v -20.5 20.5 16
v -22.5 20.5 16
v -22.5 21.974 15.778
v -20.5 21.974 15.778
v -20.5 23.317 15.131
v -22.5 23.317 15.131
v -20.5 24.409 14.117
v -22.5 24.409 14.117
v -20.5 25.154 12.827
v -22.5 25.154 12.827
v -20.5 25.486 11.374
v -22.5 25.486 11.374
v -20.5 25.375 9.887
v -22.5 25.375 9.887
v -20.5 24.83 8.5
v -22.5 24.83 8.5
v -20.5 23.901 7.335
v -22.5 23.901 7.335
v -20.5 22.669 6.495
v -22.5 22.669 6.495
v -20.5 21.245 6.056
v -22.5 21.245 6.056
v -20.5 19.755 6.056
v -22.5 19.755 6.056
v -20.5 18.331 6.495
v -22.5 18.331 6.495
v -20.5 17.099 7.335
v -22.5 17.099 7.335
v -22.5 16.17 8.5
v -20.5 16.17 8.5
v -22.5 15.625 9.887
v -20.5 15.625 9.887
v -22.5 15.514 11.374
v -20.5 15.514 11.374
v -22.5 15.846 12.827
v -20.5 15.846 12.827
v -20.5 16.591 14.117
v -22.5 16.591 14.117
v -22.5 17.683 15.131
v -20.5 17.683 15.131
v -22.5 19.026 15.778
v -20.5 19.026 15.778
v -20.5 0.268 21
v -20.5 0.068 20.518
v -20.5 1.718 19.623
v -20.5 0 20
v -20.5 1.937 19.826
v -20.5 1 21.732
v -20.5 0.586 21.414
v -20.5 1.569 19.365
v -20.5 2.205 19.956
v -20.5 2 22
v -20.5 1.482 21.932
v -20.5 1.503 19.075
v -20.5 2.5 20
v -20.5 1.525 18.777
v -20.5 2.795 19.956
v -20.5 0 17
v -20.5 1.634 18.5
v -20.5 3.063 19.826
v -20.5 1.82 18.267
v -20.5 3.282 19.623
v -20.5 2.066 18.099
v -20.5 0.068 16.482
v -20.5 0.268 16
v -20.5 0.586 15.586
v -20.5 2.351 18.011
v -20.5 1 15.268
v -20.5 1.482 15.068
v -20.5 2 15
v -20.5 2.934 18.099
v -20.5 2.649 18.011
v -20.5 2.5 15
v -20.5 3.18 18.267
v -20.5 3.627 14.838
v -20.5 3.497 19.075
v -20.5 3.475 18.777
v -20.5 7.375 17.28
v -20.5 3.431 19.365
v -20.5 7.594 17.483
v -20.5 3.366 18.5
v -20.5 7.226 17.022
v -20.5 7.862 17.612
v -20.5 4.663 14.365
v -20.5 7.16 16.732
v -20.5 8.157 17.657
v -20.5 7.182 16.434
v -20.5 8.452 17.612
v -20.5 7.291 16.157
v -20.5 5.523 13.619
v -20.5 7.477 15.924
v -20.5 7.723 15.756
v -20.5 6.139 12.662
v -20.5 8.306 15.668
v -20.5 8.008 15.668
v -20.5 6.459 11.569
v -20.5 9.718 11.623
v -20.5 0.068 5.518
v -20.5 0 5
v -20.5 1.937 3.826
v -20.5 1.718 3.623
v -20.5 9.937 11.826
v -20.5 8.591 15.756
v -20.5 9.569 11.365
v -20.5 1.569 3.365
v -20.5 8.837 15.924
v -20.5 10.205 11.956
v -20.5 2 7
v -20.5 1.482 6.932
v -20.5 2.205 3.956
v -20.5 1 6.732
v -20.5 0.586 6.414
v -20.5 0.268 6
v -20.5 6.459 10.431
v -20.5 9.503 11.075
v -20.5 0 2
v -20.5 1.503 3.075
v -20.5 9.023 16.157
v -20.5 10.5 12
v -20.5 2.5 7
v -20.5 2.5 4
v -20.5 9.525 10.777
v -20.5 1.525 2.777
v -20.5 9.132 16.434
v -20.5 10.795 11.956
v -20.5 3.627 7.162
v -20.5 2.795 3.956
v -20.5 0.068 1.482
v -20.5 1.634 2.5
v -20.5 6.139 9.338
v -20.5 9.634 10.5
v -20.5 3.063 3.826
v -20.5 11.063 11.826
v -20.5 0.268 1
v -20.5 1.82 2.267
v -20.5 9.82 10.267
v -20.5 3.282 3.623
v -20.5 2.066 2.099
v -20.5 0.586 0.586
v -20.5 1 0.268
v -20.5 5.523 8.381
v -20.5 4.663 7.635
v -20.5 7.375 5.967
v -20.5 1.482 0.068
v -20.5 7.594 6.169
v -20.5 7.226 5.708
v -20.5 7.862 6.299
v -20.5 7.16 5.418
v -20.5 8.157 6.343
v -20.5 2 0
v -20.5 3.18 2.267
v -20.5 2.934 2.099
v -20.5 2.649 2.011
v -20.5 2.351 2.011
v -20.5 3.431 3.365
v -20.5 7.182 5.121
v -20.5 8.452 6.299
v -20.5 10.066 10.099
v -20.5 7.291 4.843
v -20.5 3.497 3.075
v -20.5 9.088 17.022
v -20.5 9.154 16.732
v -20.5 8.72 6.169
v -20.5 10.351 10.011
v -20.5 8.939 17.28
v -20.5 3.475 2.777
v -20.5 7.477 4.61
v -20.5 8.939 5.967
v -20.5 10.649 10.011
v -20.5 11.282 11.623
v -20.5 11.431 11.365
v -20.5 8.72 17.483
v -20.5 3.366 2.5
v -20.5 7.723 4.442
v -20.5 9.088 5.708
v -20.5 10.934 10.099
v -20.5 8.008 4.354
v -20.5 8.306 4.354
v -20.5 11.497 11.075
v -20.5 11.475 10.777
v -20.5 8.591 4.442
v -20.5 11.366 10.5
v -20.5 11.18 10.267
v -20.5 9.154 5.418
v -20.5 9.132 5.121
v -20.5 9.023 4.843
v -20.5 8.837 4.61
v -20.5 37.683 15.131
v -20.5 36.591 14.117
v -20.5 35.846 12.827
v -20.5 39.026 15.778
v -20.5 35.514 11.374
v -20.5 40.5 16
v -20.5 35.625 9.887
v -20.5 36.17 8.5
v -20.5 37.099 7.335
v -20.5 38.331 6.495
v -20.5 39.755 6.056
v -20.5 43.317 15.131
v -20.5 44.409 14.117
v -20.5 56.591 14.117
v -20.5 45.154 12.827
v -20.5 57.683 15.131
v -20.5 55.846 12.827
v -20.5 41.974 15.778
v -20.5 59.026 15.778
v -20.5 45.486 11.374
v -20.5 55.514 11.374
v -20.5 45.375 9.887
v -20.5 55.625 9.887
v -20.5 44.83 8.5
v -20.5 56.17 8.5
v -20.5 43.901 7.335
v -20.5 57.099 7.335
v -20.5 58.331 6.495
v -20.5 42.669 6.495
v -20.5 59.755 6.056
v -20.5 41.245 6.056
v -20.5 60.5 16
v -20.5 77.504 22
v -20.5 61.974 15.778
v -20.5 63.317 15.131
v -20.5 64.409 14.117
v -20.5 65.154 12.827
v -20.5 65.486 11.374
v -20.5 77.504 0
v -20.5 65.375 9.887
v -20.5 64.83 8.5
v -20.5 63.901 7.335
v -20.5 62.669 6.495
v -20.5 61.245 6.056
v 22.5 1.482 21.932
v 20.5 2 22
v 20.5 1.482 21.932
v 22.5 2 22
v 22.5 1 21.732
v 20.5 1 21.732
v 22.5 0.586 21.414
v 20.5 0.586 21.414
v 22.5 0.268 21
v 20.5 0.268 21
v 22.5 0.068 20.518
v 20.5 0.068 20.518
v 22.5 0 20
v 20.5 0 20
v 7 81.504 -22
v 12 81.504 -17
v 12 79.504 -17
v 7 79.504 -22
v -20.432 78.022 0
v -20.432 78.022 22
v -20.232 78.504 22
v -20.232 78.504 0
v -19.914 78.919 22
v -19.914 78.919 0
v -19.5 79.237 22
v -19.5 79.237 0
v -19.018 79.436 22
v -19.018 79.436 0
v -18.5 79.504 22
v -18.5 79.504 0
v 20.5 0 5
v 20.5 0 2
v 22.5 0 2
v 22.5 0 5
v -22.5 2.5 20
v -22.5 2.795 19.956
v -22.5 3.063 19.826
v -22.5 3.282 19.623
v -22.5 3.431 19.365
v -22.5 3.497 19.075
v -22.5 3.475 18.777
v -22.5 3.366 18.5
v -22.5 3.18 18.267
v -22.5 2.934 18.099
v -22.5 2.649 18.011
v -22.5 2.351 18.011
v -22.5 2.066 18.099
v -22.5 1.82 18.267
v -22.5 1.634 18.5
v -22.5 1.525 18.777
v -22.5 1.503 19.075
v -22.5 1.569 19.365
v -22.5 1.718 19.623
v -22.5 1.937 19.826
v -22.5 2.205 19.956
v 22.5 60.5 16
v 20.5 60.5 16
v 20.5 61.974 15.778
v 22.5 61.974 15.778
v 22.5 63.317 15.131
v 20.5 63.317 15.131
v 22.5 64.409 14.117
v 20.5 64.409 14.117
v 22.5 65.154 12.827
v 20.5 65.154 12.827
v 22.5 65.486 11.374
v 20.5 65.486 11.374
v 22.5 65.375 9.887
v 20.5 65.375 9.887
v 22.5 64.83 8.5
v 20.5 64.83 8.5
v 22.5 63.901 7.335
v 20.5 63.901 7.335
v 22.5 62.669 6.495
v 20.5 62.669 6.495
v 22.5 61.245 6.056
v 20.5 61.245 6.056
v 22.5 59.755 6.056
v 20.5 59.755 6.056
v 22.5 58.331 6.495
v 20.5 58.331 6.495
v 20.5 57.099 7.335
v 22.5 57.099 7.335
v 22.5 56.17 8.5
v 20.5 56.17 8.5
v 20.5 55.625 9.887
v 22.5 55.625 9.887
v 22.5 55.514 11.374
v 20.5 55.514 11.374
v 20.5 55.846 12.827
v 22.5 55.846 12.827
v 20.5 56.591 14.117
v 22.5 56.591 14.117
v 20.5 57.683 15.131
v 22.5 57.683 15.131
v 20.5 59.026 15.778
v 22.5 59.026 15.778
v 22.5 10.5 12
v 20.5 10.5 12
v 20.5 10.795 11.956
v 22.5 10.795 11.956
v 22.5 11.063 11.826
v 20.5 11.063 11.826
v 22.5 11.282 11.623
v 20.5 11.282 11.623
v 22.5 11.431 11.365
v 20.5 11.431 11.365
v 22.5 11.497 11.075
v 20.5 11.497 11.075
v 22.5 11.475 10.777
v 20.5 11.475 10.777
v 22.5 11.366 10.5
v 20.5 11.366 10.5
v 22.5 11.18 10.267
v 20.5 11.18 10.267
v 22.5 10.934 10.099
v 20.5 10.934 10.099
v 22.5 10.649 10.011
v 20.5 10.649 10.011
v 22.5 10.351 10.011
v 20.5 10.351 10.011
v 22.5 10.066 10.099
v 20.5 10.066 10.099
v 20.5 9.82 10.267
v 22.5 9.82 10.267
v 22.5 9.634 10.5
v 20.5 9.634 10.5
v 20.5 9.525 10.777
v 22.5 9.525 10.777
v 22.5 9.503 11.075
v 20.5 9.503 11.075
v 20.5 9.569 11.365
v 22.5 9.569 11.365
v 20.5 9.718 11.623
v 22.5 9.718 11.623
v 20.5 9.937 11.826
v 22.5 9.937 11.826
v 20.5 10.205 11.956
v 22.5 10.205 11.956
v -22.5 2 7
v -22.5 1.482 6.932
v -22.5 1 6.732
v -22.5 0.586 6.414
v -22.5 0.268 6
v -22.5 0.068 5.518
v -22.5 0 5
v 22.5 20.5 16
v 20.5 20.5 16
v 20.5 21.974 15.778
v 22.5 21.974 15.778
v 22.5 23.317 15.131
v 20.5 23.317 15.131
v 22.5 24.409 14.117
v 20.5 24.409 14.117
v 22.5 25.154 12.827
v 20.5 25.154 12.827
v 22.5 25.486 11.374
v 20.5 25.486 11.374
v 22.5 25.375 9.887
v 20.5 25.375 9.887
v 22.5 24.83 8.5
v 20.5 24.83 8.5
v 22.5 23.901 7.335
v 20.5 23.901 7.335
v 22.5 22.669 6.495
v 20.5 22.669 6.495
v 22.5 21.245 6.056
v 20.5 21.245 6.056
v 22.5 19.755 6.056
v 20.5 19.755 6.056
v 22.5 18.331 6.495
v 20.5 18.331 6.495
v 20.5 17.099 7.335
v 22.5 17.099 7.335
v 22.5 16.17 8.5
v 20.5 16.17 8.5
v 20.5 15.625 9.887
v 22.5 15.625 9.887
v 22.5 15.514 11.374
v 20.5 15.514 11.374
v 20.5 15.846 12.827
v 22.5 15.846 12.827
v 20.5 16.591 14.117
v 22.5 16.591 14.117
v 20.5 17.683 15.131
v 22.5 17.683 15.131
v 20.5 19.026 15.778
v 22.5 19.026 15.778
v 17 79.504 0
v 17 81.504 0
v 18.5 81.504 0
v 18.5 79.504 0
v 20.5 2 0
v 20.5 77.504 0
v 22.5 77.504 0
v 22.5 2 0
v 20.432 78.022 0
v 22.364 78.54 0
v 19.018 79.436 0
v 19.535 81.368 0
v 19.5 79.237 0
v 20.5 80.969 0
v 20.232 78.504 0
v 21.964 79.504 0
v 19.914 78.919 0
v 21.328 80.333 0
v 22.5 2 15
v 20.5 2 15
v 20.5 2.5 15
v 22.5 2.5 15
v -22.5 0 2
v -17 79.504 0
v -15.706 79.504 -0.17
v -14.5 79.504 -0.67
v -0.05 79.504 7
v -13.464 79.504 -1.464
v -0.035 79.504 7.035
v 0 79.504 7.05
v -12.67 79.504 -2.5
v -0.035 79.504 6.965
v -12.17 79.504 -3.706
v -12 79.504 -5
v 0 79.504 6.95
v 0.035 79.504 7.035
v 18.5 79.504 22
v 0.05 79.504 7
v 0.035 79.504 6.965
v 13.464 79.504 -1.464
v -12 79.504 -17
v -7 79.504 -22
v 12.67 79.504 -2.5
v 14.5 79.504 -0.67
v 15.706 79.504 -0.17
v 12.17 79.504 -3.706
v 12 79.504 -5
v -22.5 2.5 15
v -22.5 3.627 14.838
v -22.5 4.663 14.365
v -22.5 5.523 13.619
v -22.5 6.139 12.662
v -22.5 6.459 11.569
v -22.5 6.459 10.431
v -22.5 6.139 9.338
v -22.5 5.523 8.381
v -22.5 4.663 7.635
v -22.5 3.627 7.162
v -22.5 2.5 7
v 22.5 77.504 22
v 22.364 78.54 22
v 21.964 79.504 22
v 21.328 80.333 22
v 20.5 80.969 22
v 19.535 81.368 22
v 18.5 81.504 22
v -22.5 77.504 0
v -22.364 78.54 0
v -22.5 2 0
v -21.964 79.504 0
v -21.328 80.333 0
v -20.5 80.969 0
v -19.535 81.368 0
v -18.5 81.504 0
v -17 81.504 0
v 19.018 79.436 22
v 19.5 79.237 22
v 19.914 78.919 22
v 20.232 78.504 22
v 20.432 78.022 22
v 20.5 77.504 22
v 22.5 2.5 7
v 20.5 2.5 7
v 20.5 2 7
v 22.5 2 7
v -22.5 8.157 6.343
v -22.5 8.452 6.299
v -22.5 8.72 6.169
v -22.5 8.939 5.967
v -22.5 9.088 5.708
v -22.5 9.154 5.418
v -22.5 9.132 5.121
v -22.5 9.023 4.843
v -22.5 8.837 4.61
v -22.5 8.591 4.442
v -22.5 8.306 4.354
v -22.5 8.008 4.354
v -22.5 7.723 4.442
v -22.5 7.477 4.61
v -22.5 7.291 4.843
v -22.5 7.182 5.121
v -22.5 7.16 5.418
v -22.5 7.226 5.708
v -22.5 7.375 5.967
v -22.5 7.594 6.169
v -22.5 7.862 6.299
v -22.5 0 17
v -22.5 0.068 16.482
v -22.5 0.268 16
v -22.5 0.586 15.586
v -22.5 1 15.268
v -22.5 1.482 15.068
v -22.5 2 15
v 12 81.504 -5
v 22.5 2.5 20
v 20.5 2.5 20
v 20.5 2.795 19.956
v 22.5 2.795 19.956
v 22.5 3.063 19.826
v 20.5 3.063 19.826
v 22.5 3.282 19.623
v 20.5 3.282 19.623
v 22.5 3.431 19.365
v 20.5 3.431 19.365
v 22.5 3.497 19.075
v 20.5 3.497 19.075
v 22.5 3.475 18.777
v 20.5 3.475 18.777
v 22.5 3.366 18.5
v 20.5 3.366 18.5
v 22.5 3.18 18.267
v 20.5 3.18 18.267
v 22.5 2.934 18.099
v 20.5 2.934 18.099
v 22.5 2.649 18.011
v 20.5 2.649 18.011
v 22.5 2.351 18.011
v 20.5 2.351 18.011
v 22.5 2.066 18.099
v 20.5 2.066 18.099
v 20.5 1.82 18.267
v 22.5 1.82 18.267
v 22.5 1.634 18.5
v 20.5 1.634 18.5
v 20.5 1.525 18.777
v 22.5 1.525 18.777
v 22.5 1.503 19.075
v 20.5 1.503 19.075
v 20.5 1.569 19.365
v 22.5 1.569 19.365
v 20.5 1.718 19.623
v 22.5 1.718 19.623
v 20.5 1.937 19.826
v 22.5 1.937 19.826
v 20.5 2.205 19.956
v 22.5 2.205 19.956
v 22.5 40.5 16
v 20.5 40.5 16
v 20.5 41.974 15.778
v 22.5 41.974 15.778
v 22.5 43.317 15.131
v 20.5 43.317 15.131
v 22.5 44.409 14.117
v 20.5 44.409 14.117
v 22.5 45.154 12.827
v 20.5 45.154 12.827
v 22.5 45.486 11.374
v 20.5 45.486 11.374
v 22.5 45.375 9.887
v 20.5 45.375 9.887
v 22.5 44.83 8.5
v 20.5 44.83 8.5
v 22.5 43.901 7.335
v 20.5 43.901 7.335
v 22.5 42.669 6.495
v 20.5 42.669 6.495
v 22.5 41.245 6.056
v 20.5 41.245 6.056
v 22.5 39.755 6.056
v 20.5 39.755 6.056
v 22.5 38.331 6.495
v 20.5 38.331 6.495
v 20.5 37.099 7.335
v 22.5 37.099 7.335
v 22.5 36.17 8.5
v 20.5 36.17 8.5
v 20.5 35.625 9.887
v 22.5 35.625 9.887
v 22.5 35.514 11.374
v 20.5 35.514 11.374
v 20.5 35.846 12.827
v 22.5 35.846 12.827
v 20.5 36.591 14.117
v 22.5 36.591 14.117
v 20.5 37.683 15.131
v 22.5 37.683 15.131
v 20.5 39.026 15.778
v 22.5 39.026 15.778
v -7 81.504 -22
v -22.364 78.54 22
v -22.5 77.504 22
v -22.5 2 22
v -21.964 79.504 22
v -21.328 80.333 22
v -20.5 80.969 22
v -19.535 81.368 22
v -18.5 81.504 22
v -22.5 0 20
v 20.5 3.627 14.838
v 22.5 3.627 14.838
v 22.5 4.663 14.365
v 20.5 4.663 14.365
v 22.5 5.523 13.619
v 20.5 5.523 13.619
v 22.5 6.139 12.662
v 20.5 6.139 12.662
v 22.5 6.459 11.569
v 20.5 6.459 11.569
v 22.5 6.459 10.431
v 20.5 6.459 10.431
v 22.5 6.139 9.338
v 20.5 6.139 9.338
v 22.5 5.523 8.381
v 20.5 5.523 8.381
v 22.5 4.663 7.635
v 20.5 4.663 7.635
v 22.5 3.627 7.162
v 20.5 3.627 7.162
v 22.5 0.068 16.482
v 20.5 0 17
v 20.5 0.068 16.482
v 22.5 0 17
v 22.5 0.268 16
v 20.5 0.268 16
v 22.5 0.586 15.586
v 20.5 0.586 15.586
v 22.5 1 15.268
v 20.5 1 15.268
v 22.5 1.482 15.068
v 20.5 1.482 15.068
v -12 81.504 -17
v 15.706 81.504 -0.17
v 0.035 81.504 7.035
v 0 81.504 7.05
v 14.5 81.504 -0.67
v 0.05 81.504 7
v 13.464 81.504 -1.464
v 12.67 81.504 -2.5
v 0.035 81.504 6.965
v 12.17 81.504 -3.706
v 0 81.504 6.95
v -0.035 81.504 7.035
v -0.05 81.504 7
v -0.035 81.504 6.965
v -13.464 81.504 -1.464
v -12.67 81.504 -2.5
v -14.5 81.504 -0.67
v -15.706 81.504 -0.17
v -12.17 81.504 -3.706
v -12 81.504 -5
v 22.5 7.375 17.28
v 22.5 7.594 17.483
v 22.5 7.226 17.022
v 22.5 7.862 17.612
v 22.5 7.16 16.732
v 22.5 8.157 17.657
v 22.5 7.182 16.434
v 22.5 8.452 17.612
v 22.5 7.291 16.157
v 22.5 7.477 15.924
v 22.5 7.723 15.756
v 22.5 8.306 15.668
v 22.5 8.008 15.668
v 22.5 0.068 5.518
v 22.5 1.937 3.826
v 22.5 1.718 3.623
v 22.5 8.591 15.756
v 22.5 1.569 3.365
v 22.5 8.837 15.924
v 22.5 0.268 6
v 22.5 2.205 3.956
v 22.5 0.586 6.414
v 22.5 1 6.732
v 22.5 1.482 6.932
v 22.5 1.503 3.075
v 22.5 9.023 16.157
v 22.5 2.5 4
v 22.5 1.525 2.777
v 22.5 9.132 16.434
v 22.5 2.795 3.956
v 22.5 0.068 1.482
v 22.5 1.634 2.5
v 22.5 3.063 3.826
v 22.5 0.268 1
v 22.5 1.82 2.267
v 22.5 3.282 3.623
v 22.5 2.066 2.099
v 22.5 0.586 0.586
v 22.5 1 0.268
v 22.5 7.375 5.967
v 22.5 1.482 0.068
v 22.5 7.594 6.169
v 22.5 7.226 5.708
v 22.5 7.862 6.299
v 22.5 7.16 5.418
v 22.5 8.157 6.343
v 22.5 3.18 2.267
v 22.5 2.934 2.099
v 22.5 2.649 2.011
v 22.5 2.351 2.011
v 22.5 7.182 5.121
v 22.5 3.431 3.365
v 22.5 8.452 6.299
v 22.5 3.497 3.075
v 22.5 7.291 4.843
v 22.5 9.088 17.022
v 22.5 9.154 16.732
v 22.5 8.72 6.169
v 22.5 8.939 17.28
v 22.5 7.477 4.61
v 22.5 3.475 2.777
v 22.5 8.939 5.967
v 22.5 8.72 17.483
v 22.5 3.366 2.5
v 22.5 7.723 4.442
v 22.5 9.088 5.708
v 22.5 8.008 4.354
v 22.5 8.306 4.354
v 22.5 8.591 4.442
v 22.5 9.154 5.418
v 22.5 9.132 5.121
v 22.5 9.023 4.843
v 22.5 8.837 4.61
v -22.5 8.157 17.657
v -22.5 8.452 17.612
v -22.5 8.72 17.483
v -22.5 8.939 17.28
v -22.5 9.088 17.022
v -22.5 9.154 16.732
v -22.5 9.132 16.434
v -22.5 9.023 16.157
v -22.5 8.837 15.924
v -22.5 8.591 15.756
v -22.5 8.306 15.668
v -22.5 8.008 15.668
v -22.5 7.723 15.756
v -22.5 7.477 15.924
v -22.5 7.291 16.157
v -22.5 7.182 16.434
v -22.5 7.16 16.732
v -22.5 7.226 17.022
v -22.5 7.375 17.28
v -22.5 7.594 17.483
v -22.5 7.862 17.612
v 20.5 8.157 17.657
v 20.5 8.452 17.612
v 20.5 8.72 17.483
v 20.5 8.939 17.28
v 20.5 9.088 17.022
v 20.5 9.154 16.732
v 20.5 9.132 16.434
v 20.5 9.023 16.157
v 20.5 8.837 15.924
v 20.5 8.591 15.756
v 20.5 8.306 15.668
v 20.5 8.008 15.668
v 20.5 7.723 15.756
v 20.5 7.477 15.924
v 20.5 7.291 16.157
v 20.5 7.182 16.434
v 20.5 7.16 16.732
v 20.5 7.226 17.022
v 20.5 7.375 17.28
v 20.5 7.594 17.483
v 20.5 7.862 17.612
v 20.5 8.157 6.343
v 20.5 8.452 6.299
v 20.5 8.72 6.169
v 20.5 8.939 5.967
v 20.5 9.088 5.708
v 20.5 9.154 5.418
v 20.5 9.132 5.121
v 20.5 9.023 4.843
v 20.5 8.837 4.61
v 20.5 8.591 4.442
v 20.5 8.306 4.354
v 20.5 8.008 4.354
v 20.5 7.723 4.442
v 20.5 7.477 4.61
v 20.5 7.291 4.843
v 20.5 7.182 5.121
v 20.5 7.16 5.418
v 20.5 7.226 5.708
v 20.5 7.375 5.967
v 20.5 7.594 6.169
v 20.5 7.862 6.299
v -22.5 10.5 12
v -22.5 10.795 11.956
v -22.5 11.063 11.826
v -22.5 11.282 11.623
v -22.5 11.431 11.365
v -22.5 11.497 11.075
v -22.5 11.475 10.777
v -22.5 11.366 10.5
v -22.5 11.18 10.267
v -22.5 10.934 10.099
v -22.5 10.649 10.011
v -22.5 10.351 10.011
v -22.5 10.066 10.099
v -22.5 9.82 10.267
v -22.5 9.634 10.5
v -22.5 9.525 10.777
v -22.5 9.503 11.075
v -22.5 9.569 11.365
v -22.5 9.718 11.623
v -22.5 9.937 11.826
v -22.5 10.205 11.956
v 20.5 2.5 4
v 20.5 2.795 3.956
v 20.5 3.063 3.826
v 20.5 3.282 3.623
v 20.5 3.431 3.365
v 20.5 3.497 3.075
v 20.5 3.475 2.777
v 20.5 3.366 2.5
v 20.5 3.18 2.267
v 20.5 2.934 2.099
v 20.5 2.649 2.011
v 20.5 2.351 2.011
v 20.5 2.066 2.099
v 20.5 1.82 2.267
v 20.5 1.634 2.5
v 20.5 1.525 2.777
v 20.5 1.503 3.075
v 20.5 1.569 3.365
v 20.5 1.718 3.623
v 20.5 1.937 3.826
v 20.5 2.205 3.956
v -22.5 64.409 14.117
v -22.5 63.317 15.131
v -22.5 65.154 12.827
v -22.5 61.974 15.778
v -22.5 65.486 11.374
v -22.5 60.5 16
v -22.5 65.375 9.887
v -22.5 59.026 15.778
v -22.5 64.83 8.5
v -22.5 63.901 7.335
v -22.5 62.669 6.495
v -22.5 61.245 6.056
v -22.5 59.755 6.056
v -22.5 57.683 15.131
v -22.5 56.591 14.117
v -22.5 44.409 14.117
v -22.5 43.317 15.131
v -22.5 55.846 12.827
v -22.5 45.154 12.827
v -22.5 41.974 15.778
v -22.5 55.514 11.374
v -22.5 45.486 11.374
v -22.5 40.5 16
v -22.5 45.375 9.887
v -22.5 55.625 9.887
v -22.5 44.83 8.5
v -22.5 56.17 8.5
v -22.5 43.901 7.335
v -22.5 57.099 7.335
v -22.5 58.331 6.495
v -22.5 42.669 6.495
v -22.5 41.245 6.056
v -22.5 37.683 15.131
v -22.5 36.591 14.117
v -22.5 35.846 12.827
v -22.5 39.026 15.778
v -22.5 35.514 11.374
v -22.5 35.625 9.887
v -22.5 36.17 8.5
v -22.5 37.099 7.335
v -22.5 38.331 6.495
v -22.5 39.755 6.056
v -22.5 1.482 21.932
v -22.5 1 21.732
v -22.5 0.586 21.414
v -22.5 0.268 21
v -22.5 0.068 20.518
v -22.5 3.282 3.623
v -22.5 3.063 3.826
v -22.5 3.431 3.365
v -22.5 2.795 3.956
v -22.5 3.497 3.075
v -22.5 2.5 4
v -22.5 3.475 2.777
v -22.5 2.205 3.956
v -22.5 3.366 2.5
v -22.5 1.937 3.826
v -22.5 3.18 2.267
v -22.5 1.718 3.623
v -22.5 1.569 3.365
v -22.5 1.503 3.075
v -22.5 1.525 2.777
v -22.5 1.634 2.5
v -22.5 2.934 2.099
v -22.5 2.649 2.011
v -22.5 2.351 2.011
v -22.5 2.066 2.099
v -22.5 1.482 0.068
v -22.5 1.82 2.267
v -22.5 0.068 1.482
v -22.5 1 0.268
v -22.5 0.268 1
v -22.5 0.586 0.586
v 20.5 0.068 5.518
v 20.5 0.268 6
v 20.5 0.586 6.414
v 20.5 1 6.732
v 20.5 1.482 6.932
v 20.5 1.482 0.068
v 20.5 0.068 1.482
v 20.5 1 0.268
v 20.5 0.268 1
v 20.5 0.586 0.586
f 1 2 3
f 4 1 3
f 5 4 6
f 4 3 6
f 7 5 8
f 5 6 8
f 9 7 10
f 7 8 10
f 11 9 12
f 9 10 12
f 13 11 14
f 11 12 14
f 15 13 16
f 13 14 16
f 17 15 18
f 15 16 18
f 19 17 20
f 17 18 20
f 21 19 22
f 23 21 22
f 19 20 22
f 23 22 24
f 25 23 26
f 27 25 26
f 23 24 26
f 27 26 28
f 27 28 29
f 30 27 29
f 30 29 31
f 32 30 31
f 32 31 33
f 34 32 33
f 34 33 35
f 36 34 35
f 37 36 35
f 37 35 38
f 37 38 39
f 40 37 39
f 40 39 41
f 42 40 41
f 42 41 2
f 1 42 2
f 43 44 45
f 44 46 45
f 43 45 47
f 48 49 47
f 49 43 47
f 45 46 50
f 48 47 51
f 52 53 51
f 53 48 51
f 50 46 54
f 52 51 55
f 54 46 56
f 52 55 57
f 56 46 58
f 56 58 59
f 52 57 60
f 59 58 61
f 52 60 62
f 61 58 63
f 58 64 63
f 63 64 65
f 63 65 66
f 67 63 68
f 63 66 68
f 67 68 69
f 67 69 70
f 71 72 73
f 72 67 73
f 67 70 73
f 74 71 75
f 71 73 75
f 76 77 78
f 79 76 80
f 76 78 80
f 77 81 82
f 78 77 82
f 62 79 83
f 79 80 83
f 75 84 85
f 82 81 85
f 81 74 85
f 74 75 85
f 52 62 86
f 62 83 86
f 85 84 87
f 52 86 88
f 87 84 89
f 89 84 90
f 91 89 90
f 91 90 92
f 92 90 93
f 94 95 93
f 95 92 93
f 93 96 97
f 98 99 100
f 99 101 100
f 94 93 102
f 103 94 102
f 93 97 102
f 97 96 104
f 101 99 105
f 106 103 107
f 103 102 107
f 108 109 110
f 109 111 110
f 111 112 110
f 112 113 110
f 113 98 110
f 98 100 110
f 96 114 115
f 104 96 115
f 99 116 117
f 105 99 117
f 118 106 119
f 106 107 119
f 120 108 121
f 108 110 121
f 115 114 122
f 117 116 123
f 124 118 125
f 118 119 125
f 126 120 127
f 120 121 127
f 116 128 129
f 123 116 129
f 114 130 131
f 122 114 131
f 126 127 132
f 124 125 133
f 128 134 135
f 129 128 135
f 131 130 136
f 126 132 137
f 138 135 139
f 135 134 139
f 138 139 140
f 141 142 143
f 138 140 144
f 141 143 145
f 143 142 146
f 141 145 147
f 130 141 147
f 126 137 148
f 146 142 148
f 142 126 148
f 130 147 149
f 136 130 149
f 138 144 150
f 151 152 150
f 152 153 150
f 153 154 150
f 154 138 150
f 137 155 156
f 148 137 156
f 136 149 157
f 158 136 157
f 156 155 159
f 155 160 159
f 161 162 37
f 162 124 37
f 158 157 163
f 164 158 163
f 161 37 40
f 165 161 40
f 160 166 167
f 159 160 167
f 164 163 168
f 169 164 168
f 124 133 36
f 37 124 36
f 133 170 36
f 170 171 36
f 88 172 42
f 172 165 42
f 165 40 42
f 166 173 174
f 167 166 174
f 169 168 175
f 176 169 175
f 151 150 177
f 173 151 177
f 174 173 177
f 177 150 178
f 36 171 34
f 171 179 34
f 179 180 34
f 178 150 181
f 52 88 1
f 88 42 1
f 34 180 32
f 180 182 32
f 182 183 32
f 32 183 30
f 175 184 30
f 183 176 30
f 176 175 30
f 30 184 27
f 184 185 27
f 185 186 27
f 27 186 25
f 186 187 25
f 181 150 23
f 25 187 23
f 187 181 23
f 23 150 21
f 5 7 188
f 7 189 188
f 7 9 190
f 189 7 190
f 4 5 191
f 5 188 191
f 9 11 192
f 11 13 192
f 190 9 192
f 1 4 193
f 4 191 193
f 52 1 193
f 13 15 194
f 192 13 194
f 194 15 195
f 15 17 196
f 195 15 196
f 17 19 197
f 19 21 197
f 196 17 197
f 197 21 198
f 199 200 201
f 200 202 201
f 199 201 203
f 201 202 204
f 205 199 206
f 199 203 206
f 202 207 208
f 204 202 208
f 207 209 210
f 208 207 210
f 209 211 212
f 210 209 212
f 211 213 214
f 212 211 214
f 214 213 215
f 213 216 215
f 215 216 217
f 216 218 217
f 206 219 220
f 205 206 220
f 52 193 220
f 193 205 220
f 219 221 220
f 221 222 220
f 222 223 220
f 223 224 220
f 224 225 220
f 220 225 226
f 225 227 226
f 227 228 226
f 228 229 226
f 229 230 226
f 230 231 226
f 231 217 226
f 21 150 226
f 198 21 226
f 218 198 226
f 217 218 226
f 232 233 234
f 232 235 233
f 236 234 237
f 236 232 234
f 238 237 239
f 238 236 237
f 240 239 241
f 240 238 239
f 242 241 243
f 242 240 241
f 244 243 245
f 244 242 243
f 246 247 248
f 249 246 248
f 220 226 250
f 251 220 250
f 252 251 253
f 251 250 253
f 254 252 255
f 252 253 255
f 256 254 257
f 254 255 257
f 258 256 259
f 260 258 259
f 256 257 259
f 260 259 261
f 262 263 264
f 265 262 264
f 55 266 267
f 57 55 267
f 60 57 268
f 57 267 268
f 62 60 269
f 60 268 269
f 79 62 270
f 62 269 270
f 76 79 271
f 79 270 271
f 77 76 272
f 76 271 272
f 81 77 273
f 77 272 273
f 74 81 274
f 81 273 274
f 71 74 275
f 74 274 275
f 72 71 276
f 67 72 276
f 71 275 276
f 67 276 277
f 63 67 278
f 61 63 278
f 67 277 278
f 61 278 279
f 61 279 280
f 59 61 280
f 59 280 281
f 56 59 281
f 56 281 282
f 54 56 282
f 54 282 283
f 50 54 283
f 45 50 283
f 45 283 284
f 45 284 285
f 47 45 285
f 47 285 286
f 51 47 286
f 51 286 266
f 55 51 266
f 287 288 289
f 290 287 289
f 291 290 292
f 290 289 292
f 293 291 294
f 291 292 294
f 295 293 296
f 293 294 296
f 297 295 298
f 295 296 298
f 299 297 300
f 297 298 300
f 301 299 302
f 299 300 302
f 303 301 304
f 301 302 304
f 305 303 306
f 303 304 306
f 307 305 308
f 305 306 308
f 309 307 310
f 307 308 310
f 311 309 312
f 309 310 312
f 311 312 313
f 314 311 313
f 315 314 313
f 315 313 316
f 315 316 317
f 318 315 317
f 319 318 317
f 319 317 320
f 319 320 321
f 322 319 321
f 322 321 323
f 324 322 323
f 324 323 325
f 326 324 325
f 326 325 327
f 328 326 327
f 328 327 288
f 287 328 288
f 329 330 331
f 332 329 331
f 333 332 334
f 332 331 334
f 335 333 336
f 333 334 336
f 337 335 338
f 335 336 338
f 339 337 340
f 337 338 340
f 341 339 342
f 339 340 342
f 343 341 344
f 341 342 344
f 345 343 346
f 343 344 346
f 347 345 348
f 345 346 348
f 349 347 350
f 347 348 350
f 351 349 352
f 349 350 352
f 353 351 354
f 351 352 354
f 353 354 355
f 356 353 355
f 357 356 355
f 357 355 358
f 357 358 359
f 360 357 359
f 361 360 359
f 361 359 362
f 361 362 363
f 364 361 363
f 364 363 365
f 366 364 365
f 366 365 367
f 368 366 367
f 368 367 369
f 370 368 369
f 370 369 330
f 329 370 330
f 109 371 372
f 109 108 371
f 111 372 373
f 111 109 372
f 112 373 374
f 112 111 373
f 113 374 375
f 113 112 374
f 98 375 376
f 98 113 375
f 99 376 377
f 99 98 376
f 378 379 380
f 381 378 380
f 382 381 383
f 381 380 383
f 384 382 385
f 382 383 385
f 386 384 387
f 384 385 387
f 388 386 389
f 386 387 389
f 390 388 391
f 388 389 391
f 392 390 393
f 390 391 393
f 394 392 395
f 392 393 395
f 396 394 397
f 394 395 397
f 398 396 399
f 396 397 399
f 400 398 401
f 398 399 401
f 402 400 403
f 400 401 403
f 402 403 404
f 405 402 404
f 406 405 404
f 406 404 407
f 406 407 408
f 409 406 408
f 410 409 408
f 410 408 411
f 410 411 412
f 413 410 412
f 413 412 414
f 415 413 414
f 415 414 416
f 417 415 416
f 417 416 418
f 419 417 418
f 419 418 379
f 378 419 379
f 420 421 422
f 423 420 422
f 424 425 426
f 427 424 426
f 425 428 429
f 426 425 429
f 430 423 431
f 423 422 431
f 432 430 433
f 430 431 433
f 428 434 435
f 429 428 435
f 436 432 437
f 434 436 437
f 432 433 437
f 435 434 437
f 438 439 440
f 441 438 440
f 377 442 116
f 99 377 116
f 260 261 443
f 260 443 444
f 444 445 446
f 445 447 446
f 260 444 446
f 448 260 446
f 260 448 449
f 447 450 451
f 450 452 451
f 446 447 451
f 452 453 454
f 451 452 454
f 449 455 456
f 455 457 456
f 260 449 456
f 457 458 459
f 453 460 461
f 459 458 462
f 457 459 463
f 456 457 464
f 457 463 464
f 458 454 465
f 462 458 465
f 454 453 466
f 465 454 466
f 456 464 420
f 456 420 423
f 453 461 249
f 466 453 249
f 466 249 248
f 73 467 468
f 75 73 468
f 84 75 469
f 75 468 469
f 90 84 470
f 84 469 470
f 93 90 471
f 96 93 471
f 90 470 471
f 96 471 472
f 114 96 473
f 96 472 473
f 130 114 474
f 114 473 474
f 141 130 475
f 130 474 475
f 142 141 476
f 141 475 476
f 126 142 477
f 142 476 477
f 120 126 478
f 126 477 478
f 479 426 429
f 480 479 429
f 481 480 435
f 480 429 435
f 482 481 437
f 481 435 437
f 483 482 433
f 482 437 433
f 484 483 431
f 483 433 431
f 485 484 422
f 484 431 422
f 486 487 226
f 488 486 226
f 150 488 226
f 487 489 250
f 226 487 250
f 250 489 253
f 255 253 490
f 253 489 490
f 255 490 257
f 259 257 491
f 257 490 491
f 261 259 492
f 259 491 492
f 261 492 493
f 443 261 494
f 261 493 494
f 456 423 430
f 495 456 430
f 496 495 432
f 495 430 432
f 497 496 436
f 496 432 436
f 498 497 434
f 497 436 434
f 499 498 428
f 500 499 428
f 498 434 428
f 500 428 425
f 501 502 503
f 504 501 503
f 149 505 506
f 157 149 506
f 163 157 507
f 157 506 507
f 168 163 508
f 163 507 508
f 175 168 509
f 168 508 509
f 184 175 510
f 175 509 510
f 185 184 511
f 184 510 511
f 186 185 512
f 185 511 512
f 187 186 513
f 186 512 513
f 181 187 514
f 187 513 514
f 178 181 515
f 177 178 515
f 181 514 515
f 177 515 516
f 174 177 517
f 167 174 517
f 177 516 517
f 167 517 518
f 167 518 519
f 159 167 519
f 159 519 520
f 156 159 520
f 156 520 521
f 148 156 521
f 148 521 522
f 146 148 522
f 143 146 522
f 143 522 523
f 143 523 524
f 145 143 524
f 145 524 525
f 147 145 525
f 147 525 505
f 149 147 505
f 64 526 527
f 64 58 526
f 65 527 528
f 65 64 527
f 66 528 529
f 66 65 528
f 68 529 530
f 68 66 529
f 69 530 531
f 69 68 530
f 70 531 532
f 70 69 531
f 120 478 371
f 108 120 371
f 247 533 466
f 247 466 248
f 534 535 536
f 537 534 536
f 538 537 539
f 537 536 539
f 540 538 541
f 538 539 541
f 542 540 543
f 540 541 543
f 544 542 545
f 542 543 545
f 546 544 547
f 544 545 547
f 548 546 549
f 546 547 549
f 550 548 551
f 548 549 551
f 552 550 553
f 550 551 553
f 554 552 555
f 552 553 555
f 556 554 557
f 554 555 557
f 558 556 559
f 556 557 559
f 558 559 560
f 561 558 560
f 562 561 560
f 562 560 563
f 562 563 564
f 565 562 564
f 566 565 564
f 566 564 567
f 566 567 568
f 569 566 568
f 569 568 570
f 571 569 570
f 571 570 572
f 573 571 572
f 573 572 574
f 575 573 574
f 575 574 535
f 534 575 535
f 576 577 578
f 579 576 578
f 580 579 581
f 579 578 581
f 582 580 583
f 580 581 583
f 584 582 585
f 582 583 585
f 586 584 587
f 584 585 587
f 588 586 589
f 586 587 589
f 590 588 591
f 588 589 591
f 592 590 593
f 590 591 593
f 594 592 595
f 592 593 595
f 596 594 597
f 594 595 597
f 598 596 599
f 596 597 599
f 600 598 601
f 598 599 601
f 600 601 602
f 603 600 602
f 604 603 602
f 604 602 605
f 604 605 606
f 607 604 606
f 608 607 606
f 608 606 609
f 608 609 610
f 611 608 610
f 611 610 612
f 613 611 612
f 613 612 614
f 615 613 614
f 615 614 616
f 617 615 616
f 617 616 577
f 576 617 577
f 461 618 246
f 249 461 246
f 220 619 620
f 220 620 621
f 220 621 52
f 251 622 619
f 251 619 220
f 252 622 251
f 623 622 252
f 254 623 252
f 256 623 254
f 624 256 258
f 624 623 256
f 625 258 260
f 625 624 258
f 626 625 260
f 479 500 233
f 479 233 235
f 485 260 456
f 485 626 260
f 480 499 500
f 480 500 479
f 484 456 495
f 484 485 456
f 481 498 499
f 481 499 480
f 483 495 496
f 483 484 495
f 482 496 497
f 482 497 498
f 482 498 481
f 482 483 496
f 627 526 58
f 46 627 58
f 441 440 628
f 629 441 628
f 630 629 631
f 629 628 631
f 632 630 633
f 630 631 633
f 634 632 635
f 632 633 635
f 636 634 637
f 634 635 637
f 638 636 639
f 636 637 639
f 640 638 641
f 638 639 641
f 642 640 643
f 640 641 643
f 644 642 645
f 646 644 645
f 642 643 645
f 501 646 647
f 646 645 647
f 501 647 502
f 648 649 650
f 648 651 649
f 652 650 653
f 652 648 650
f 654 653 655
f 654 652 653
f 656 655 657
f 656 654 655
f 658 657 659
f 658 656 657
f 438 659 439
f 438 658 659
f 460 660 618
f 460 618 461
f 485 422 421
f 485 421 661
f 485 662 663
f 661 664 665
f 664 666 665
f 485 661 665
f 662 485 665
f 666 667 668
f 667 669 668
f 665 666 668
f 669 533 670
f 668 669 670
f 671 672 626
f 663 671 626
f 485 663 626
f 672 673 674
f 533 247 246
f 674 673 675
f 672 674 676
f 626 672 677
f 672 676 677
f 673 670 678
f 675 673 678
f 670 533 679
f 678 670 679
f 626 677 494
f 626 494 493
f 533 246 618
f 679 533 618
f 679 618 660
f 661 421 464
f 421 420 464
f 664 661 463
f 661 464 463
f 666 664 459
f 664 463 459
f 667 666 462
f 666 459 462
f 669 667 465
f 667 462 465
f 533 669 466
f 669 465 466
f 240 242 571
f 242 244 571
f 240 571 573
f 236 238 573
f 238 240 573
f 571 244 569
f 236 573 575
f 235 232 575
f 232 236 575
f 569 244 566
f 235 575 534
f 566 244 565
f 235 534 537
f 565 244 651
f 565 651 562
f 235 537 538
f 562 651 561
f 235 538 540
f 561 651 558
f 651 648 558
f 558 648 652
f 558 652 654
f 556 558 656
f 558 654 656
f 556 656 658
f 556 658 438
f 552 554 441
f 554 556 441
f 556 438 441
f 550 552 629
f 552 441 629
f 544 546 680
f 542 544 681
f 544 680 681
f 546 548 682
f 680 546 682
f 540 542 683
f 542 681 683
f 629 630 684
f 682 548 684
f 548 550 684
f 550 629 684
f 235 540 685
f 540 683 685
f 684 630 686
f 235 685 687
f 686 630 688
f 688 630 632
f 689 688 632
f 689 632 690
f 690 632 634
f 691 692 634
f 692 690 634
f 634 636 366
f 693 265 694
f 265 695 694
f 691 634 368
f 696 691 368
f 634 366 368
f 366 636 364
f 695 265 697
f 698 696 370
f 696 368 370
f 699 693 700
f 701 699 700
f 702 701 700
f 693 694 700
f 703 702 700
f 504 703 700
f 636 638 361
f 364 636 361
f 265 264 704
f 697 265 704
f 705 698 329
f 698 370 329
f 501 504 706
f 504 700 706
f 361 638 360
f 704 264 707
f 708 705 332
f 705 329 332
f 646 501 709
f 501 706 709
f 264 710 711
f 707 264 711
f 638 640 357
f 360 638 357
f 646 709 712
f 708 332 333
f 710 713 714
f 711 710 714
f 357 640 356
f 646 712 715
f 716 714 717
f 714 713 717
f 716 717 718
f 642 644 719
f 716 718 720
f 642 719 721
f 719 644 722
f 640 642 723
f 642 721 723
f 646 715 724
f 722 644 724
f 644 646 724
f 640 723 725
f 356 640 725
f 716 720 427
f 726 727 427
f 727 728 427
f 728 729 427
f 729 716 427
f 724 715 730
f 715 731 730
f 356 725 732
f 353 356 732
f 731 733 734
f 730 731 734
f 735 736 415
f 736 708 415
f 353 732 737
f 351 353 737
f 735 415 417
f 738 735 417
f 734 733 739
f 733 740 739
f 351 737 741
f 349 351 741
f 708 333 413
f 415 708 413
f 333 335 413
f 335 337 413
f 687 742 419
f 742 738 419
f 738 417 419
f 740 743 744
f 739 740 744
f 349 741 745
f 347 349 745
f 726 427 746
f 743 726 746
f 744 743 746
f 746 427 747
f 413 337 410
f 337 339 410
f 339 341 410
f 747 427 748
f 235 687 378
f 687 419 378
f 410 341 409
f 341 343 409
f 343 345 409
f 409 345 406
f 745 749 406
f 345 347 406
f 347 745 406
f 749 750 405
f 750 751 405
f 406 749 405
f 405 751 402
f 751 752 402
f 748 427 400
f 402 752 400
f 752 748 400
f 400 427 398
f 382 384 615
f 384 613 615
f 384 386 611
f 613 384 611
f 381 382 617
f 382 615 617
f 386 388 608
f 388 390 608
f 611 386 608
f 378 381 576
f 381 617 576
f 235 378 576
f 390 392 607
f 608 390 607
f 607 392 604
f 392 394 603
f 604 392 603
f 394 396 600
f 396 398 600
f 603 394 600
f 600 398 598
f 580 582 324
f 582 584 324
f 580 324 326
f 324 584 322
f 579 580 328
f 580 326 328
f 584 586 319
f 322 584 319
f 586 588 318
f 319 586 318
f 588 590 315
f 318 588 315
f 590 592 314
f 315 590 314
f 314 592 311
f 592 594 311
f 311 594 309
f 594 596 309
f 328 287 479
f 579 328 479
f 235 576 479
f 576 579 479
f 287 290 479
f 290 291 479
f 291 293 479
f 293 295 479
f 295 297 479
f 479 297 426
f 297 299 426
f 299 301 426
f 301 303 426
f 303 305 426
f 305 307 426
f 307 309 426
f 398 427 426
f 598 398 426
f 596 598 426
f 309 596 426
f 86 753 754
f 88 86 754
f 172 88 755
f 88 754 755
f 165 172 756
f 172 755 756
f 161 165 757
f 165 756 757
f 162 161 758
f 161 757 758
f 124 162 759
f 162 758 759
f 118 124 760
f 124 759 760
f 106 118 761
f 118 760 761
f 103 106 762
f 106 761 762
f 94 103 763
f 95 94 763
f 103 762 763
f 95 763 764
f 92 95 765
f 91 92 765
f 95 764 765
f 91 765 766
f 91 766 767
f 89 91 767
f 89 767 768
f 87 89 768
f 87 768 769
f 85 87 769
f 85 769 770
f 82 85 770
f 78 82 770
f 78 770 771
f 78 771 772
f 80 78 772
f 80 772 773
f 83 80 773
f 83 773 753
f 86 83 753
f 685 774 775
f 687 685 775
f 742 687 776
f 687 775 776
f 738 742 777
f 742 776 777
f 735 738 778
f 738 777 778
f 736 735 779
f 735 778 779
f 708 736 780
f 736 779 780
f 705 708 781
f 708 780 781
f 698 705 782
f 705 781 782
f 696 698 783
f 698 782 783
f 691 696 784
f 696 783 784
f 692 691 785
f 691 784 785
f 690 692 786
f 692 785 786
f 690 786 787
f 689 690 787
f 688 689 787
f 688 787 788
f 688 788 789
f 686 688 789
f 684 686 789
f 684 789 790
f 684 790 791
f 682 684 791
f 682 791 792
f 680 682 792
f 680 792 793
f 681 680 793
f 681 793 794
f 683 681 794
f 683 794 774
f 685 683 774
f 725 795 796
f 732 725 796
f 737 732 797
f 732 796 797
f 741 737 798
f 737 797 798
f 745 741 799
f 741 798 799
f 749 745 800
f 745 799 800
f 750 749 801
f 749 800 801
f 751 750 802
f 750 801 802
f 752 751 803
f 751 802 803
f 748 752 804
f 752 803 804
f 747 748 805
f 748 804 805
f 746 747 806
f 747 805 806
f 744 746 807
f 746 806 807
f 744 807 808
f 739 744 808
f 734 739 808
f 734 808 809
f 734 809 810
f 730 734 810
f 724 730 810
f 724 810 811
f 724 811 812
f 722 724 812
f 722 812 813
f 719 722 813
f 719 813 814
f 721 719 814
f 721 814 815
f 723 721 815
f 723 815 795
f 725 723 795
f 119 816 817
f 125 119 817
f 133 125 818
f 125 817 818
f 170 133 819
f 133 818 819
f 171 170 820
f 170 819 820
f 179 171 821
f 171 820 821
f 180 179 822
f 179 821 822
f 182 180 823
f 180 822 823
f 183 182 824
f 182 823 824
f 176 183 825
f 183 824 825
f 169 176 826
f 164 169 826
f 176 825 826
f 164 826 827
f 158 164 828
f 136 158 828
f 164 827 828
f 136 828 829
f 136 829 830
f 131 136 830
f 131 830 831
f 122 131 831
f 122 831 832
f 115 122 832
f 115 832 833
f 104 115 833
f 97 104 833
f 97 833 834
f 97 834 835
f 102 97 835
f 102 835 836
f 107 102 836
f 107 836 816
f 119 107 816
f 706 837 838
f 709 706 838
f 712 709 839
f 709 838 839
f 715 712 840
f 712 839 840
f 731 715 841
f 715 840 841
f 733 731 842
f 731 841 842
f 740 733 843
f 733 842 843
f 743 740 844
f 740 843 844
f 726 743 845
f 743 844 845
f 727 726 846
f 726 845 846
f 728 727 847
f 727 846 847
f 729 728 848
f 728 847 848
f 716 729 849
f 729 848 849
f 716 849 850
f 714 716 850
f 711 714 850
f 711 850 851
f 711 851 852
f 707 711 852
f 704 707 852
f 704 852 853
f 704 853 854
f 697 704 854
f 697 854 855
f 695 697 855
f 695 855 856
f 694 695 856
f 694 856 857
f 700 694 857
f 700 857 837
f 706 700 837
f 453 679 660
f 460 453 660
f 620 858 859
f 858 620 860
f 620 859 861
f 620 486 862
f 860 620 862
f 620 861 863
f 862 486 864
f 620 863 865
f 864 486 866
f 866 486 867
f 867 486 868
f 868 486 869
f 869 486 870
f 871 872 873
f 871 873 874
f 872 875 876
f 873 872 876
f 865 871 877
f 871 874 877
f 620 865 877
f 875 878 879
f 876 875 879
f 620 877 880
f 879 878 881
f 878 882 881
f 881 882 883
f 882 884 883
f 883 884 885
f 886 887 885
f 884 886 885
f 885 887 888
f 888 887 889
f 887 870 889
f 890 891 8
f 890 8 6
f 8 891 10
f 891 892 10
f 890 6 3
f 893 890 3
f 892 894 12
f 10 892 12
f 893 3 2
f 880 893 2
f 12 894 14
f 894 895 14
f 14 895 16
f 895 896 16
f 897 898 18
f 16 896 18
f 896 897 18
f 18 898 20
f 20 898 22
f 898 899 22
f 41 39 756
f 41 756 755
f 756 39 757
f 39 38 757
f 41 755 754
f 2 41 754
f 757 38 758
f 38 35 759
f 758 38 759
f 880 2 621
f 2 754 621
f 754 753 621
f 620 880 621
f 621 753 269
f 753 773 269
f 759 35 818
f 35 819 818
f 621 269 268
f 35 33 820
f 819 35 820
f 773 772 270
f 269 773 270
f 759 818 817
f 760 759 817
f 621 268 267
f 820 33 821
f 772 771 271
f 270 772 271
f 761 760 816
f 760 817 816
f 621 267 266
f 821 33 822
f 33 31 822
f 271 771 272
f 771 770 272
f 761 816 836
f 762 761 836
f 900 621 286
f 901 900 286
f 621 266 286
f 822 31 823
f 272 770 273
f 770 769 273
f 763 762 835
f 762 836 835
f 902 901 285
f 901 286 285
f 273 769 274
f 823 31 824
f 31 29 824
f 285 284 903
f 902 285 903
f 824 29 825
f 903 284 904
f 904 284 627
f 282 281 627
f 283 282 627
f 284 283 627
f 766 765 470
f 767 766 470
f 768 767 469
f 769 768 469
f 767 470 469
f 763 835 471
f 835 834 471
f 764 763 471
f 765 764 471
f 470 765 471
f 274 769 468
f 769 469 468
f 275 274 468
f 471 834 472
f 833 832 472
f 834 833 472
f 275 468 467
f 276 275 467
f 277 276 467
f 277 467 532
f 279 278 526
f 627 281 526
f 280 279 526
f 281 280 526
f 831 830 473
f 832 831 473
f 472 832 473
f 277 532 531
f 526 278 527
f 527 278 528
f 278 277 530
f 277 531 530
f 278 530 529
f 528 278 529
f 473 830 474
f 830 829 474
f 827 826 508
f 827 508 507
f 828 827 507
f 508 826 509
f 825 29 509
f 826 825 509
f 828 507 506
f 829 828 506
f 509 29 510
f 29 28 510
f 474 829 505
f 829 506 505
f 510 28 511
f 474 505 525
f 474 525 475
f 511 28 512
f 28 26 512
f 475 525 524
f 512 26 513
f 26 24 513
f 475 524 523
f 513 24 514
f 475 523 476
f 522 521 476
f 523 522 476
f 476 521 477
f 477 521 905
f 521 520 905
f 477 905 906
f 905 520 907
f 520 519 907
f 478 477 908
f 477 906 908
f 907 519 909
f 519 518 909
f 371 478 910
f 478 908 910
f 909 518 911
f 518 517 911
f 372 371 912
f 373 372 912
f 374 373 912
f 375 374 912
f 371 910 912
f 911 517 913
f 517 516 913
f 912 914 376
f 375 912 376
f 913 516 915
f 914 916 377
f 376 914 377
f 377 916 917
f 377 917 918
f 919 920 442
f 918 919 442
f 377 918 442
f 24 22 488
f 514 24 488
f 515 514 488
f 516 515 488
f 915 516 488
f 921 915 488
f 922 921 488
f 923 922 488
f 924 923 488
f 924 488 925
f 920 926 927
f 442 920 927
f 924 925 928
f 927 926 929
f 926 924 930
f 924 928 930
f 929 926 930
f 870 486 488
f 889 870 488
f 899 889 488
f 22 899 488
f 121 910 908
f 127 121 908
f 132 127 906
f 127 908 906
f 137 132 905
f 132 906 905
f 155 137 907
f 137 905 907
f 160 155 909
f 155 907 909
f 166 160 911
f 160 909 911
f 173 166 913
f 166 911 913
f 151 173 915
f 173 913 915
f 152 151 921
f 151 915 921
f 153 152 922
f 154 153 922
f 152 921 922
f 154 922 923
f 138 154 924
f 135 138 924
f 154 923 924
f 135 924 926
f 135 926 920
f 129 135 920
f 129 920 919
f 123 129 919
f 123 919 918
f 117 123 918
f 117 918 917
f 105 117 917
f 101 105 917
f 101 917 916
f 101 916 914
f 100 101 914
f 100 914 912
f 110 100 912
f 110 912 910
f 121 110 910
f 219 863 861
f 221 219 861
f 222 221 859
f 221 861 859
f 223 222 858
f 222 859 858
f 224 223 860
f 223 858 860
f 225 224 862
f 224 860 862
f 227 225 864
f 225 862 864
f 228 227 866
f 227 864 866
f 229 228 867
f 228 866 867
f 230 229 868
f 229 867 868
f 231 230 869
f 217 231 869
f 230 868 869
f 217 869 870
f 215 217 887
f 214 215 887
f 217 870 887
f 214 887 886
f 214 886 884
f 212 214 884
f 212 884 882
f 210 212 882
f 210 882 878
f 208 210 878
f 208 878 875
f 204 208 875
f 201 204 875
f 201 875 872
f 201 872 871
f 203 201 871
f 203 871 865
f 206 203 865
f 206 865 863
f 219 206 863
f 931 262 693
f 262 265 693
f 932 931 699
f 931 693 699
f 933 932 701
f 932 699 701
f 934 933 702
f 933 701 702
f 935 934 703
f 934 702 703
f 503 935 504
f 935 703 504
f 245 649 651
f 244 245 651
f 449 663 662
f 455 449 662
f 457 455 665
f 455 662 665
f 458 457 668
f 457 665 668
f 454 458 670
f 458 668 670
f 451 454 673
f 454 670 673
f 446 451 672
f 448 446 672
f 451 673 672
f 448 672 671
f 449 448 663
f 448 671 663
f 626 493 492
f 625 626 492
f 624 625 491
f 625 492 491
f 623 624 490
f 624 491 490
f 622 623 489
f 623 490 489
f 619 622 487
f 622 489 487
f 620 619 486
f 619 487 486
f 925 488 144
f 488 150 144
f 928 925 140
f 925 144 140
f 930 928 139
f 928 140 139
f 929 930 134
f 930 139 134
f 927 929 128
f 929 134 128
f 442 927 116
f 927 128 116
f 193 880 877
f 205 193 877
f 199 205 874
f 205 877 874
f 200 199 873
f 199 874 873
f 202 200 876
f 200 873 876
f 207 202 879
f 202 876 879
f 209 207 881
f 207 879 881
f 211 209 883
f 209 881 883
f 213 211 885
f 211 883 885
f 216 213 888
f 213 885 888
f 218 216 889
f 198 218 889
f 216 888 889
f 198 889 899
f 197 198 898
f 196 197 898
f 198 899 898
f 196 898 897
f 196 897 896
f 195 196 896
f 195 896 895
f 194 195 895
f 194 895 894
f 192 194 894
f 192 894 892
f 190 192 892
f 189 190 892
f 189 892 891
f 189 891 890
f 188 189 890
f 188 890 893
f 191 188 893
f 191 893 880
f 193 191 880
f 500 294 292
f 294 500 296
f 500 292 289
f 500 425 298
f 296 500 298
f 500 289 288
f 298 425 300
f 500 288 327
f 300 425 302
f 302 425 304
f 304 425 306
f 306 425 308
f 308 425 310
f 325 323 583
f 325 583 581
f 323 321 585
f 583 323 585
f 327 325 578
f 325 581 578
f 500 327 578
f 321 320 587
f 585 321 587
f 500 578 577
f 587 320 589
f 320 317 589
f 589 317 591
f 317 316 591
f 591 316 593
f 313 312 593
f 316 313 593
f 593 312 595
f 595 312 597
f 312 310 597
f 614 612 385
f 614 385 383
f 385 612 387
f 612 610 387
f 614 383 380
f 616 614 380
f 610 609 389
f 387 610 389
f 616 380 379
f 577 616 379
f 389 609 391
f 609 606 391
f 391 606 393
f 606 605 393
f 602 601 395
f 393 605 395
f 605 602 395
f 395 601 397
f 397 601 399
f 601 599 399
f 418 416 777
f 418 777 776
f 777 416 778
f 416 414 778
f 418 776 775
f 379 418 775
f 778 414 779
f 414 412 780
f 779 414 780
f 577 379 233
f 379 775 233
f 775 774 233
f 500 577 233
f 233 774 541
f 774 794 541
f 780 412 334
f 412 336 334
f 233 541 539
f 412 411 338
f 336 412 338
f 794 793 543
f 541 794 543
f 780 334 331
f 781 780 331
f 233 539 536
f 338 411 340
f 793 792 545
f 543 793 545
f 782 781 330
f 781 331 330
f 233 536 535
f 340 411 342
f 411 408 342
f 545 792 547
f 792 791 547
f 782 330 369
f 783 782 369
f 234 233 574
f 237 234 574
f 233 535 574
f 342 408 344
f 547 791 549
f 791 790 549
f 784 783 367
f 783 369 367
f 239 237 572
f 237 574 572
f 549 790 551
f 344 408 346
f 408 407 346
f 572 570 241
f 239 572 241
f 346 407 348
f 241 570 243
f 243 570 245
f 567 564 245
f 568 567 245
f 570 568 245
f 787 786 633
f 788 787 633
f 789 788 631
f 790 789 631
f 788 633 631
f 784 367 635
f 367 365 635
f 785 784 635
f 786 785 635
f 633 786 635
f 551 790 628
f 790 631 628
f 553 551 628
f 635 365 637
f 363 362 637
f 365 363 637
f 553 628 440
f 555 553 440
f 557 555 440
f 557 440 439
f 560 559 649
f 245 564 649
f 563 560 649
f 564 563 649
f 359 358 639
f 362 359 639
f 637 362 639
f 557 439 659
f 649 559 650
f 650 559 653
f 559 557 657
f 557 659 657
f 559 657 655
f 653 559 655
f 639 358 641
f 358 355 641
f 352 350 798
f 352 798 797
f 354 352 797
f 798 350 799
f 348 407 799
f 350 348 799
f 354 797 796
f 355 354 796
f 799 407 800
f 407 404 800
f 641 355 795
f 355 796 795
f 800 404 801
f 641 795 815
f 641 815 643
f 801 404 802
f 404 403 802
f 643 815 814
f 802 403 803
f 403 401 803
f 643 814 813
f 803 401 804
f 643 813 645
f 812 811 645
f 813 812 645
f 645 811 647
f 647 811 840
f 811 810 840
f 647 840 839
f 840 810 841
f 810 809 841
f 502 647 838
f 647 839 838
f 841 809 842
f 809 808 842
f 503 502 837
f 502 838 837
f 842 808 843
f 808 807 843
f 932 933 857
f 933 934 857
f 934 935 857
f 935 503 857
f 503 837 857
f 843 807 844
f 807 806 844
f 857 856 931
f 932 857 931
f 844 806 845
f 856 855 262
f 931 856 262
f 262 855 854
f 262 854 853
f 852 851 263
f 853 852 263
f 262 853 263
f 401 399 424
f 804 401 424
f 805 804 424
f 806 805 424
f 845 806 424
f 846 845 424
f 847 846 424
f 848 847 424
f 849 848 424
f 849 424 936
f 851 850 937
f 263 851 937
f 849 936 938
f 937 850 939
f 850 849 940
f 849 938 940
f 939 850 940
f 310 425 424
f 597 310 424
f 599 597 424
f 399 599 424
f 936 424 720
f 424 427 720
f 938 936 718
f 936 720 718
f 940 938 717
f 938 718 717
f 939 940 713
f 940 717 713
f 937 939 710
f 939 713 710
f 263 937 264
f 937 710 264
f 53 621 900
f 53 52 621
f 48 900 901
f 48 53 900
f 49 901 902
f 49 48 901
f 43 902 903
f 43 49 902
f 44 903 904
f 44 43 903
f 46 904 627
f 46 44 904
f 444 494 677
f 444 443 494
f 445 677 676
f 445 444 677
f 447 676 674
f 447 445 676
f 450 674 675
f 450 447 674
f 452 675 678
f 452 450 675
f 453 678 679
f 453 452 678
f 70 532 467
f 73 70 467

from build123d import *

# Parameters (mm, degrees)
BASE_FLANGE1_DEPTH = 22
CUT_EXTRUDE1_DEPTH = 96.665963068
FILLET1_R          = 2
SKETCH4_R          = 1
CUT_EXTRUDE2_DEPTH = 96.665963068
SKETCH5_W          = 24
SKETCH5_H          = 22
TAB1_DEPTH         = 2
SKETCH6_R          = 0.05
CUT_EXTRUDE3_DEPTH = 10
FILLET2_R          = 5
CHAMFER1_SIZE      = 5
SKETCH7_R          = 5
CUT_EXTRUDE4_DEPTH = 96.665963068


# Sheet-metal steps are written as plain solids
with BuildPart() as part:
    # Sketch1 → Base-Flange1 (new body)
    with BuildSketch(Plane.XY):
        with BuildLine():
            Line((-20.5, 0), (-20.5, 77.50445687))
            ThreePointArc((-20.5, 77.50445687), (-19.914213562, 78.918670432), (-18.5, 79.50445687))
            Line((-18.5, 79.50445687), (18.5, 79.50445687))
            ThreePointArc((18.5, 79.50445687), (19.914213562, 78.918670432), (20.5, 77.50445687))
            Line((20.5, 77.50445687), (20.5, 0))
            Line((20.5, 0), (22.5, 0))
            Line((22.5, 0), (22.5, 77.50445687))
            ThreePointArc((22.5, 77.50445687), (21.328427125, 80.332883995), (18.5, 81.50445687))
            Line((18.5, 81.50445687), (-18.5, 81.50445687))
            ThreePointArc((-18.5, 81.50445687), (-21.328427125, 80.332883995), (-22.5, 77.50445687))
            Line((-22.5, 77.50445687), (-22.5, 0))
            Line((-22.5, 0), (-20.5, 0))
        make_face()
    extrude(amount=BASE_FLANGE1_DEPTH)

    # Sketch3 → Cut-Extrude1 (cut, through all)
    with BuildSketch(Plane.ZY.offset(22.5)):
        with BuildLine():
            Line((7, 0), (15, 0))
            Line((15, 0), (15, 2.5))
            ThreePointArc((15, 2.5), (11, 6.5), (7, 2.5))
            Line((7, 2.5), (7, 0))
        make_face()
    extrude(amount=-CUT_EXTRUDE1_DEPTH, mode=Mode.SUBTRACT)

    # Fillet1
    fillet1_edges = [part.edges().sort_by_distance(p)[0] for p in [
        (21.5, 0, 0),
        (-21.5, 0, 0),
        (21.5, 0, 22),
        (-21.5, 0, 7),
        (-21.5, 0, 15),
        (21.5, 0, 7),
        (21.5, 0, 15),
        (-21.5, 0, 22),
    ]]
    fillet(fillet1_edges, radius=FILLET1_R)

    # Sketch4 → Cut-Extrude2 (cut, through all)
    with BuildSketch(Plane.ZY.offset(22.5)):
        with Locations((19, 2.5)):
            Circle(SKETCH4_R)
        with Locations((16.656854249, 8.156854249)):
            Circle(SKETCH4_R)
        with Locations((11, 10.5)):
            Circle(SKETCH4_R)
        with Locations((5.343145751, 8.156854249)):
            Circle(SKETCH4_R)
        with Locations((3, 2.5)):
            Circle(SKETCH4_R)
    extrude(amount=-CUT_EXTRUDE2_DEPTH, mode=Mode.SUBTRACT)

    # Sketch5 → Tab1 (add)
    with BuildSketch(Plane(origin=(0, 81.50445687, 0), x_dir=(1, 0, 0), z_dir=(0, 1, 0))):
        with Locations((0, 11)):
            Rectangle(SKETCH5_W, SKETCH5_H)
    extrude(amount=-TAB1_DEPTH)

    # Sketch6 → Cut-Extrude3 (cut)
    with BuildSketch(Plane(origin=(0, 81.50445687, 0), x_dir=(1, 0, 0), z_dir=(0, 1, 0))):
        with Locations(Location((0, -7, 0), (0, 0, 270))):
            Circle(SKETCH6_R)
    extrude(amount=-CUT_EXTRUDE3_DEPTH, mode=Mode.SUBTRACT)

    # Fillet2
    fillet2_edges = [part.edges().sort_by_distance(p)[0] for p in [
        (-12, 80.50445687, 0),
        (12, 80.50445687, 0),
    ]]
    fillet(fillet2_edges, radius=FILLET2_R)

    # Chamfer1
    chamfer1_edges = [part.edges().sort_by_distance(p)[0] for p in [
        (-12, 80.50445687, -22),
        (12, 80.50445687, -22),
    ]]
    chamfer(chamfer1_edges, length=CHAMFER1_SIZE)

    # Sketch7 → Cut-Extrude4 (cut, through all)
    with BuildSketch(Plane.ZY.offset(22.5)):
        with Locations((11, 40.5)):
            Circle(SKETCH7_R)
        with Locations((11, 60.5)):
            Circle(SKETCH7_R)
        with Locations((11, 20.5)):
            Circle(SKETCH7_R)
    extrude(amount=-CUT_EXTRUDE4_DEPTH, mode=Mode.SUBTRACT)


solid = part.part
